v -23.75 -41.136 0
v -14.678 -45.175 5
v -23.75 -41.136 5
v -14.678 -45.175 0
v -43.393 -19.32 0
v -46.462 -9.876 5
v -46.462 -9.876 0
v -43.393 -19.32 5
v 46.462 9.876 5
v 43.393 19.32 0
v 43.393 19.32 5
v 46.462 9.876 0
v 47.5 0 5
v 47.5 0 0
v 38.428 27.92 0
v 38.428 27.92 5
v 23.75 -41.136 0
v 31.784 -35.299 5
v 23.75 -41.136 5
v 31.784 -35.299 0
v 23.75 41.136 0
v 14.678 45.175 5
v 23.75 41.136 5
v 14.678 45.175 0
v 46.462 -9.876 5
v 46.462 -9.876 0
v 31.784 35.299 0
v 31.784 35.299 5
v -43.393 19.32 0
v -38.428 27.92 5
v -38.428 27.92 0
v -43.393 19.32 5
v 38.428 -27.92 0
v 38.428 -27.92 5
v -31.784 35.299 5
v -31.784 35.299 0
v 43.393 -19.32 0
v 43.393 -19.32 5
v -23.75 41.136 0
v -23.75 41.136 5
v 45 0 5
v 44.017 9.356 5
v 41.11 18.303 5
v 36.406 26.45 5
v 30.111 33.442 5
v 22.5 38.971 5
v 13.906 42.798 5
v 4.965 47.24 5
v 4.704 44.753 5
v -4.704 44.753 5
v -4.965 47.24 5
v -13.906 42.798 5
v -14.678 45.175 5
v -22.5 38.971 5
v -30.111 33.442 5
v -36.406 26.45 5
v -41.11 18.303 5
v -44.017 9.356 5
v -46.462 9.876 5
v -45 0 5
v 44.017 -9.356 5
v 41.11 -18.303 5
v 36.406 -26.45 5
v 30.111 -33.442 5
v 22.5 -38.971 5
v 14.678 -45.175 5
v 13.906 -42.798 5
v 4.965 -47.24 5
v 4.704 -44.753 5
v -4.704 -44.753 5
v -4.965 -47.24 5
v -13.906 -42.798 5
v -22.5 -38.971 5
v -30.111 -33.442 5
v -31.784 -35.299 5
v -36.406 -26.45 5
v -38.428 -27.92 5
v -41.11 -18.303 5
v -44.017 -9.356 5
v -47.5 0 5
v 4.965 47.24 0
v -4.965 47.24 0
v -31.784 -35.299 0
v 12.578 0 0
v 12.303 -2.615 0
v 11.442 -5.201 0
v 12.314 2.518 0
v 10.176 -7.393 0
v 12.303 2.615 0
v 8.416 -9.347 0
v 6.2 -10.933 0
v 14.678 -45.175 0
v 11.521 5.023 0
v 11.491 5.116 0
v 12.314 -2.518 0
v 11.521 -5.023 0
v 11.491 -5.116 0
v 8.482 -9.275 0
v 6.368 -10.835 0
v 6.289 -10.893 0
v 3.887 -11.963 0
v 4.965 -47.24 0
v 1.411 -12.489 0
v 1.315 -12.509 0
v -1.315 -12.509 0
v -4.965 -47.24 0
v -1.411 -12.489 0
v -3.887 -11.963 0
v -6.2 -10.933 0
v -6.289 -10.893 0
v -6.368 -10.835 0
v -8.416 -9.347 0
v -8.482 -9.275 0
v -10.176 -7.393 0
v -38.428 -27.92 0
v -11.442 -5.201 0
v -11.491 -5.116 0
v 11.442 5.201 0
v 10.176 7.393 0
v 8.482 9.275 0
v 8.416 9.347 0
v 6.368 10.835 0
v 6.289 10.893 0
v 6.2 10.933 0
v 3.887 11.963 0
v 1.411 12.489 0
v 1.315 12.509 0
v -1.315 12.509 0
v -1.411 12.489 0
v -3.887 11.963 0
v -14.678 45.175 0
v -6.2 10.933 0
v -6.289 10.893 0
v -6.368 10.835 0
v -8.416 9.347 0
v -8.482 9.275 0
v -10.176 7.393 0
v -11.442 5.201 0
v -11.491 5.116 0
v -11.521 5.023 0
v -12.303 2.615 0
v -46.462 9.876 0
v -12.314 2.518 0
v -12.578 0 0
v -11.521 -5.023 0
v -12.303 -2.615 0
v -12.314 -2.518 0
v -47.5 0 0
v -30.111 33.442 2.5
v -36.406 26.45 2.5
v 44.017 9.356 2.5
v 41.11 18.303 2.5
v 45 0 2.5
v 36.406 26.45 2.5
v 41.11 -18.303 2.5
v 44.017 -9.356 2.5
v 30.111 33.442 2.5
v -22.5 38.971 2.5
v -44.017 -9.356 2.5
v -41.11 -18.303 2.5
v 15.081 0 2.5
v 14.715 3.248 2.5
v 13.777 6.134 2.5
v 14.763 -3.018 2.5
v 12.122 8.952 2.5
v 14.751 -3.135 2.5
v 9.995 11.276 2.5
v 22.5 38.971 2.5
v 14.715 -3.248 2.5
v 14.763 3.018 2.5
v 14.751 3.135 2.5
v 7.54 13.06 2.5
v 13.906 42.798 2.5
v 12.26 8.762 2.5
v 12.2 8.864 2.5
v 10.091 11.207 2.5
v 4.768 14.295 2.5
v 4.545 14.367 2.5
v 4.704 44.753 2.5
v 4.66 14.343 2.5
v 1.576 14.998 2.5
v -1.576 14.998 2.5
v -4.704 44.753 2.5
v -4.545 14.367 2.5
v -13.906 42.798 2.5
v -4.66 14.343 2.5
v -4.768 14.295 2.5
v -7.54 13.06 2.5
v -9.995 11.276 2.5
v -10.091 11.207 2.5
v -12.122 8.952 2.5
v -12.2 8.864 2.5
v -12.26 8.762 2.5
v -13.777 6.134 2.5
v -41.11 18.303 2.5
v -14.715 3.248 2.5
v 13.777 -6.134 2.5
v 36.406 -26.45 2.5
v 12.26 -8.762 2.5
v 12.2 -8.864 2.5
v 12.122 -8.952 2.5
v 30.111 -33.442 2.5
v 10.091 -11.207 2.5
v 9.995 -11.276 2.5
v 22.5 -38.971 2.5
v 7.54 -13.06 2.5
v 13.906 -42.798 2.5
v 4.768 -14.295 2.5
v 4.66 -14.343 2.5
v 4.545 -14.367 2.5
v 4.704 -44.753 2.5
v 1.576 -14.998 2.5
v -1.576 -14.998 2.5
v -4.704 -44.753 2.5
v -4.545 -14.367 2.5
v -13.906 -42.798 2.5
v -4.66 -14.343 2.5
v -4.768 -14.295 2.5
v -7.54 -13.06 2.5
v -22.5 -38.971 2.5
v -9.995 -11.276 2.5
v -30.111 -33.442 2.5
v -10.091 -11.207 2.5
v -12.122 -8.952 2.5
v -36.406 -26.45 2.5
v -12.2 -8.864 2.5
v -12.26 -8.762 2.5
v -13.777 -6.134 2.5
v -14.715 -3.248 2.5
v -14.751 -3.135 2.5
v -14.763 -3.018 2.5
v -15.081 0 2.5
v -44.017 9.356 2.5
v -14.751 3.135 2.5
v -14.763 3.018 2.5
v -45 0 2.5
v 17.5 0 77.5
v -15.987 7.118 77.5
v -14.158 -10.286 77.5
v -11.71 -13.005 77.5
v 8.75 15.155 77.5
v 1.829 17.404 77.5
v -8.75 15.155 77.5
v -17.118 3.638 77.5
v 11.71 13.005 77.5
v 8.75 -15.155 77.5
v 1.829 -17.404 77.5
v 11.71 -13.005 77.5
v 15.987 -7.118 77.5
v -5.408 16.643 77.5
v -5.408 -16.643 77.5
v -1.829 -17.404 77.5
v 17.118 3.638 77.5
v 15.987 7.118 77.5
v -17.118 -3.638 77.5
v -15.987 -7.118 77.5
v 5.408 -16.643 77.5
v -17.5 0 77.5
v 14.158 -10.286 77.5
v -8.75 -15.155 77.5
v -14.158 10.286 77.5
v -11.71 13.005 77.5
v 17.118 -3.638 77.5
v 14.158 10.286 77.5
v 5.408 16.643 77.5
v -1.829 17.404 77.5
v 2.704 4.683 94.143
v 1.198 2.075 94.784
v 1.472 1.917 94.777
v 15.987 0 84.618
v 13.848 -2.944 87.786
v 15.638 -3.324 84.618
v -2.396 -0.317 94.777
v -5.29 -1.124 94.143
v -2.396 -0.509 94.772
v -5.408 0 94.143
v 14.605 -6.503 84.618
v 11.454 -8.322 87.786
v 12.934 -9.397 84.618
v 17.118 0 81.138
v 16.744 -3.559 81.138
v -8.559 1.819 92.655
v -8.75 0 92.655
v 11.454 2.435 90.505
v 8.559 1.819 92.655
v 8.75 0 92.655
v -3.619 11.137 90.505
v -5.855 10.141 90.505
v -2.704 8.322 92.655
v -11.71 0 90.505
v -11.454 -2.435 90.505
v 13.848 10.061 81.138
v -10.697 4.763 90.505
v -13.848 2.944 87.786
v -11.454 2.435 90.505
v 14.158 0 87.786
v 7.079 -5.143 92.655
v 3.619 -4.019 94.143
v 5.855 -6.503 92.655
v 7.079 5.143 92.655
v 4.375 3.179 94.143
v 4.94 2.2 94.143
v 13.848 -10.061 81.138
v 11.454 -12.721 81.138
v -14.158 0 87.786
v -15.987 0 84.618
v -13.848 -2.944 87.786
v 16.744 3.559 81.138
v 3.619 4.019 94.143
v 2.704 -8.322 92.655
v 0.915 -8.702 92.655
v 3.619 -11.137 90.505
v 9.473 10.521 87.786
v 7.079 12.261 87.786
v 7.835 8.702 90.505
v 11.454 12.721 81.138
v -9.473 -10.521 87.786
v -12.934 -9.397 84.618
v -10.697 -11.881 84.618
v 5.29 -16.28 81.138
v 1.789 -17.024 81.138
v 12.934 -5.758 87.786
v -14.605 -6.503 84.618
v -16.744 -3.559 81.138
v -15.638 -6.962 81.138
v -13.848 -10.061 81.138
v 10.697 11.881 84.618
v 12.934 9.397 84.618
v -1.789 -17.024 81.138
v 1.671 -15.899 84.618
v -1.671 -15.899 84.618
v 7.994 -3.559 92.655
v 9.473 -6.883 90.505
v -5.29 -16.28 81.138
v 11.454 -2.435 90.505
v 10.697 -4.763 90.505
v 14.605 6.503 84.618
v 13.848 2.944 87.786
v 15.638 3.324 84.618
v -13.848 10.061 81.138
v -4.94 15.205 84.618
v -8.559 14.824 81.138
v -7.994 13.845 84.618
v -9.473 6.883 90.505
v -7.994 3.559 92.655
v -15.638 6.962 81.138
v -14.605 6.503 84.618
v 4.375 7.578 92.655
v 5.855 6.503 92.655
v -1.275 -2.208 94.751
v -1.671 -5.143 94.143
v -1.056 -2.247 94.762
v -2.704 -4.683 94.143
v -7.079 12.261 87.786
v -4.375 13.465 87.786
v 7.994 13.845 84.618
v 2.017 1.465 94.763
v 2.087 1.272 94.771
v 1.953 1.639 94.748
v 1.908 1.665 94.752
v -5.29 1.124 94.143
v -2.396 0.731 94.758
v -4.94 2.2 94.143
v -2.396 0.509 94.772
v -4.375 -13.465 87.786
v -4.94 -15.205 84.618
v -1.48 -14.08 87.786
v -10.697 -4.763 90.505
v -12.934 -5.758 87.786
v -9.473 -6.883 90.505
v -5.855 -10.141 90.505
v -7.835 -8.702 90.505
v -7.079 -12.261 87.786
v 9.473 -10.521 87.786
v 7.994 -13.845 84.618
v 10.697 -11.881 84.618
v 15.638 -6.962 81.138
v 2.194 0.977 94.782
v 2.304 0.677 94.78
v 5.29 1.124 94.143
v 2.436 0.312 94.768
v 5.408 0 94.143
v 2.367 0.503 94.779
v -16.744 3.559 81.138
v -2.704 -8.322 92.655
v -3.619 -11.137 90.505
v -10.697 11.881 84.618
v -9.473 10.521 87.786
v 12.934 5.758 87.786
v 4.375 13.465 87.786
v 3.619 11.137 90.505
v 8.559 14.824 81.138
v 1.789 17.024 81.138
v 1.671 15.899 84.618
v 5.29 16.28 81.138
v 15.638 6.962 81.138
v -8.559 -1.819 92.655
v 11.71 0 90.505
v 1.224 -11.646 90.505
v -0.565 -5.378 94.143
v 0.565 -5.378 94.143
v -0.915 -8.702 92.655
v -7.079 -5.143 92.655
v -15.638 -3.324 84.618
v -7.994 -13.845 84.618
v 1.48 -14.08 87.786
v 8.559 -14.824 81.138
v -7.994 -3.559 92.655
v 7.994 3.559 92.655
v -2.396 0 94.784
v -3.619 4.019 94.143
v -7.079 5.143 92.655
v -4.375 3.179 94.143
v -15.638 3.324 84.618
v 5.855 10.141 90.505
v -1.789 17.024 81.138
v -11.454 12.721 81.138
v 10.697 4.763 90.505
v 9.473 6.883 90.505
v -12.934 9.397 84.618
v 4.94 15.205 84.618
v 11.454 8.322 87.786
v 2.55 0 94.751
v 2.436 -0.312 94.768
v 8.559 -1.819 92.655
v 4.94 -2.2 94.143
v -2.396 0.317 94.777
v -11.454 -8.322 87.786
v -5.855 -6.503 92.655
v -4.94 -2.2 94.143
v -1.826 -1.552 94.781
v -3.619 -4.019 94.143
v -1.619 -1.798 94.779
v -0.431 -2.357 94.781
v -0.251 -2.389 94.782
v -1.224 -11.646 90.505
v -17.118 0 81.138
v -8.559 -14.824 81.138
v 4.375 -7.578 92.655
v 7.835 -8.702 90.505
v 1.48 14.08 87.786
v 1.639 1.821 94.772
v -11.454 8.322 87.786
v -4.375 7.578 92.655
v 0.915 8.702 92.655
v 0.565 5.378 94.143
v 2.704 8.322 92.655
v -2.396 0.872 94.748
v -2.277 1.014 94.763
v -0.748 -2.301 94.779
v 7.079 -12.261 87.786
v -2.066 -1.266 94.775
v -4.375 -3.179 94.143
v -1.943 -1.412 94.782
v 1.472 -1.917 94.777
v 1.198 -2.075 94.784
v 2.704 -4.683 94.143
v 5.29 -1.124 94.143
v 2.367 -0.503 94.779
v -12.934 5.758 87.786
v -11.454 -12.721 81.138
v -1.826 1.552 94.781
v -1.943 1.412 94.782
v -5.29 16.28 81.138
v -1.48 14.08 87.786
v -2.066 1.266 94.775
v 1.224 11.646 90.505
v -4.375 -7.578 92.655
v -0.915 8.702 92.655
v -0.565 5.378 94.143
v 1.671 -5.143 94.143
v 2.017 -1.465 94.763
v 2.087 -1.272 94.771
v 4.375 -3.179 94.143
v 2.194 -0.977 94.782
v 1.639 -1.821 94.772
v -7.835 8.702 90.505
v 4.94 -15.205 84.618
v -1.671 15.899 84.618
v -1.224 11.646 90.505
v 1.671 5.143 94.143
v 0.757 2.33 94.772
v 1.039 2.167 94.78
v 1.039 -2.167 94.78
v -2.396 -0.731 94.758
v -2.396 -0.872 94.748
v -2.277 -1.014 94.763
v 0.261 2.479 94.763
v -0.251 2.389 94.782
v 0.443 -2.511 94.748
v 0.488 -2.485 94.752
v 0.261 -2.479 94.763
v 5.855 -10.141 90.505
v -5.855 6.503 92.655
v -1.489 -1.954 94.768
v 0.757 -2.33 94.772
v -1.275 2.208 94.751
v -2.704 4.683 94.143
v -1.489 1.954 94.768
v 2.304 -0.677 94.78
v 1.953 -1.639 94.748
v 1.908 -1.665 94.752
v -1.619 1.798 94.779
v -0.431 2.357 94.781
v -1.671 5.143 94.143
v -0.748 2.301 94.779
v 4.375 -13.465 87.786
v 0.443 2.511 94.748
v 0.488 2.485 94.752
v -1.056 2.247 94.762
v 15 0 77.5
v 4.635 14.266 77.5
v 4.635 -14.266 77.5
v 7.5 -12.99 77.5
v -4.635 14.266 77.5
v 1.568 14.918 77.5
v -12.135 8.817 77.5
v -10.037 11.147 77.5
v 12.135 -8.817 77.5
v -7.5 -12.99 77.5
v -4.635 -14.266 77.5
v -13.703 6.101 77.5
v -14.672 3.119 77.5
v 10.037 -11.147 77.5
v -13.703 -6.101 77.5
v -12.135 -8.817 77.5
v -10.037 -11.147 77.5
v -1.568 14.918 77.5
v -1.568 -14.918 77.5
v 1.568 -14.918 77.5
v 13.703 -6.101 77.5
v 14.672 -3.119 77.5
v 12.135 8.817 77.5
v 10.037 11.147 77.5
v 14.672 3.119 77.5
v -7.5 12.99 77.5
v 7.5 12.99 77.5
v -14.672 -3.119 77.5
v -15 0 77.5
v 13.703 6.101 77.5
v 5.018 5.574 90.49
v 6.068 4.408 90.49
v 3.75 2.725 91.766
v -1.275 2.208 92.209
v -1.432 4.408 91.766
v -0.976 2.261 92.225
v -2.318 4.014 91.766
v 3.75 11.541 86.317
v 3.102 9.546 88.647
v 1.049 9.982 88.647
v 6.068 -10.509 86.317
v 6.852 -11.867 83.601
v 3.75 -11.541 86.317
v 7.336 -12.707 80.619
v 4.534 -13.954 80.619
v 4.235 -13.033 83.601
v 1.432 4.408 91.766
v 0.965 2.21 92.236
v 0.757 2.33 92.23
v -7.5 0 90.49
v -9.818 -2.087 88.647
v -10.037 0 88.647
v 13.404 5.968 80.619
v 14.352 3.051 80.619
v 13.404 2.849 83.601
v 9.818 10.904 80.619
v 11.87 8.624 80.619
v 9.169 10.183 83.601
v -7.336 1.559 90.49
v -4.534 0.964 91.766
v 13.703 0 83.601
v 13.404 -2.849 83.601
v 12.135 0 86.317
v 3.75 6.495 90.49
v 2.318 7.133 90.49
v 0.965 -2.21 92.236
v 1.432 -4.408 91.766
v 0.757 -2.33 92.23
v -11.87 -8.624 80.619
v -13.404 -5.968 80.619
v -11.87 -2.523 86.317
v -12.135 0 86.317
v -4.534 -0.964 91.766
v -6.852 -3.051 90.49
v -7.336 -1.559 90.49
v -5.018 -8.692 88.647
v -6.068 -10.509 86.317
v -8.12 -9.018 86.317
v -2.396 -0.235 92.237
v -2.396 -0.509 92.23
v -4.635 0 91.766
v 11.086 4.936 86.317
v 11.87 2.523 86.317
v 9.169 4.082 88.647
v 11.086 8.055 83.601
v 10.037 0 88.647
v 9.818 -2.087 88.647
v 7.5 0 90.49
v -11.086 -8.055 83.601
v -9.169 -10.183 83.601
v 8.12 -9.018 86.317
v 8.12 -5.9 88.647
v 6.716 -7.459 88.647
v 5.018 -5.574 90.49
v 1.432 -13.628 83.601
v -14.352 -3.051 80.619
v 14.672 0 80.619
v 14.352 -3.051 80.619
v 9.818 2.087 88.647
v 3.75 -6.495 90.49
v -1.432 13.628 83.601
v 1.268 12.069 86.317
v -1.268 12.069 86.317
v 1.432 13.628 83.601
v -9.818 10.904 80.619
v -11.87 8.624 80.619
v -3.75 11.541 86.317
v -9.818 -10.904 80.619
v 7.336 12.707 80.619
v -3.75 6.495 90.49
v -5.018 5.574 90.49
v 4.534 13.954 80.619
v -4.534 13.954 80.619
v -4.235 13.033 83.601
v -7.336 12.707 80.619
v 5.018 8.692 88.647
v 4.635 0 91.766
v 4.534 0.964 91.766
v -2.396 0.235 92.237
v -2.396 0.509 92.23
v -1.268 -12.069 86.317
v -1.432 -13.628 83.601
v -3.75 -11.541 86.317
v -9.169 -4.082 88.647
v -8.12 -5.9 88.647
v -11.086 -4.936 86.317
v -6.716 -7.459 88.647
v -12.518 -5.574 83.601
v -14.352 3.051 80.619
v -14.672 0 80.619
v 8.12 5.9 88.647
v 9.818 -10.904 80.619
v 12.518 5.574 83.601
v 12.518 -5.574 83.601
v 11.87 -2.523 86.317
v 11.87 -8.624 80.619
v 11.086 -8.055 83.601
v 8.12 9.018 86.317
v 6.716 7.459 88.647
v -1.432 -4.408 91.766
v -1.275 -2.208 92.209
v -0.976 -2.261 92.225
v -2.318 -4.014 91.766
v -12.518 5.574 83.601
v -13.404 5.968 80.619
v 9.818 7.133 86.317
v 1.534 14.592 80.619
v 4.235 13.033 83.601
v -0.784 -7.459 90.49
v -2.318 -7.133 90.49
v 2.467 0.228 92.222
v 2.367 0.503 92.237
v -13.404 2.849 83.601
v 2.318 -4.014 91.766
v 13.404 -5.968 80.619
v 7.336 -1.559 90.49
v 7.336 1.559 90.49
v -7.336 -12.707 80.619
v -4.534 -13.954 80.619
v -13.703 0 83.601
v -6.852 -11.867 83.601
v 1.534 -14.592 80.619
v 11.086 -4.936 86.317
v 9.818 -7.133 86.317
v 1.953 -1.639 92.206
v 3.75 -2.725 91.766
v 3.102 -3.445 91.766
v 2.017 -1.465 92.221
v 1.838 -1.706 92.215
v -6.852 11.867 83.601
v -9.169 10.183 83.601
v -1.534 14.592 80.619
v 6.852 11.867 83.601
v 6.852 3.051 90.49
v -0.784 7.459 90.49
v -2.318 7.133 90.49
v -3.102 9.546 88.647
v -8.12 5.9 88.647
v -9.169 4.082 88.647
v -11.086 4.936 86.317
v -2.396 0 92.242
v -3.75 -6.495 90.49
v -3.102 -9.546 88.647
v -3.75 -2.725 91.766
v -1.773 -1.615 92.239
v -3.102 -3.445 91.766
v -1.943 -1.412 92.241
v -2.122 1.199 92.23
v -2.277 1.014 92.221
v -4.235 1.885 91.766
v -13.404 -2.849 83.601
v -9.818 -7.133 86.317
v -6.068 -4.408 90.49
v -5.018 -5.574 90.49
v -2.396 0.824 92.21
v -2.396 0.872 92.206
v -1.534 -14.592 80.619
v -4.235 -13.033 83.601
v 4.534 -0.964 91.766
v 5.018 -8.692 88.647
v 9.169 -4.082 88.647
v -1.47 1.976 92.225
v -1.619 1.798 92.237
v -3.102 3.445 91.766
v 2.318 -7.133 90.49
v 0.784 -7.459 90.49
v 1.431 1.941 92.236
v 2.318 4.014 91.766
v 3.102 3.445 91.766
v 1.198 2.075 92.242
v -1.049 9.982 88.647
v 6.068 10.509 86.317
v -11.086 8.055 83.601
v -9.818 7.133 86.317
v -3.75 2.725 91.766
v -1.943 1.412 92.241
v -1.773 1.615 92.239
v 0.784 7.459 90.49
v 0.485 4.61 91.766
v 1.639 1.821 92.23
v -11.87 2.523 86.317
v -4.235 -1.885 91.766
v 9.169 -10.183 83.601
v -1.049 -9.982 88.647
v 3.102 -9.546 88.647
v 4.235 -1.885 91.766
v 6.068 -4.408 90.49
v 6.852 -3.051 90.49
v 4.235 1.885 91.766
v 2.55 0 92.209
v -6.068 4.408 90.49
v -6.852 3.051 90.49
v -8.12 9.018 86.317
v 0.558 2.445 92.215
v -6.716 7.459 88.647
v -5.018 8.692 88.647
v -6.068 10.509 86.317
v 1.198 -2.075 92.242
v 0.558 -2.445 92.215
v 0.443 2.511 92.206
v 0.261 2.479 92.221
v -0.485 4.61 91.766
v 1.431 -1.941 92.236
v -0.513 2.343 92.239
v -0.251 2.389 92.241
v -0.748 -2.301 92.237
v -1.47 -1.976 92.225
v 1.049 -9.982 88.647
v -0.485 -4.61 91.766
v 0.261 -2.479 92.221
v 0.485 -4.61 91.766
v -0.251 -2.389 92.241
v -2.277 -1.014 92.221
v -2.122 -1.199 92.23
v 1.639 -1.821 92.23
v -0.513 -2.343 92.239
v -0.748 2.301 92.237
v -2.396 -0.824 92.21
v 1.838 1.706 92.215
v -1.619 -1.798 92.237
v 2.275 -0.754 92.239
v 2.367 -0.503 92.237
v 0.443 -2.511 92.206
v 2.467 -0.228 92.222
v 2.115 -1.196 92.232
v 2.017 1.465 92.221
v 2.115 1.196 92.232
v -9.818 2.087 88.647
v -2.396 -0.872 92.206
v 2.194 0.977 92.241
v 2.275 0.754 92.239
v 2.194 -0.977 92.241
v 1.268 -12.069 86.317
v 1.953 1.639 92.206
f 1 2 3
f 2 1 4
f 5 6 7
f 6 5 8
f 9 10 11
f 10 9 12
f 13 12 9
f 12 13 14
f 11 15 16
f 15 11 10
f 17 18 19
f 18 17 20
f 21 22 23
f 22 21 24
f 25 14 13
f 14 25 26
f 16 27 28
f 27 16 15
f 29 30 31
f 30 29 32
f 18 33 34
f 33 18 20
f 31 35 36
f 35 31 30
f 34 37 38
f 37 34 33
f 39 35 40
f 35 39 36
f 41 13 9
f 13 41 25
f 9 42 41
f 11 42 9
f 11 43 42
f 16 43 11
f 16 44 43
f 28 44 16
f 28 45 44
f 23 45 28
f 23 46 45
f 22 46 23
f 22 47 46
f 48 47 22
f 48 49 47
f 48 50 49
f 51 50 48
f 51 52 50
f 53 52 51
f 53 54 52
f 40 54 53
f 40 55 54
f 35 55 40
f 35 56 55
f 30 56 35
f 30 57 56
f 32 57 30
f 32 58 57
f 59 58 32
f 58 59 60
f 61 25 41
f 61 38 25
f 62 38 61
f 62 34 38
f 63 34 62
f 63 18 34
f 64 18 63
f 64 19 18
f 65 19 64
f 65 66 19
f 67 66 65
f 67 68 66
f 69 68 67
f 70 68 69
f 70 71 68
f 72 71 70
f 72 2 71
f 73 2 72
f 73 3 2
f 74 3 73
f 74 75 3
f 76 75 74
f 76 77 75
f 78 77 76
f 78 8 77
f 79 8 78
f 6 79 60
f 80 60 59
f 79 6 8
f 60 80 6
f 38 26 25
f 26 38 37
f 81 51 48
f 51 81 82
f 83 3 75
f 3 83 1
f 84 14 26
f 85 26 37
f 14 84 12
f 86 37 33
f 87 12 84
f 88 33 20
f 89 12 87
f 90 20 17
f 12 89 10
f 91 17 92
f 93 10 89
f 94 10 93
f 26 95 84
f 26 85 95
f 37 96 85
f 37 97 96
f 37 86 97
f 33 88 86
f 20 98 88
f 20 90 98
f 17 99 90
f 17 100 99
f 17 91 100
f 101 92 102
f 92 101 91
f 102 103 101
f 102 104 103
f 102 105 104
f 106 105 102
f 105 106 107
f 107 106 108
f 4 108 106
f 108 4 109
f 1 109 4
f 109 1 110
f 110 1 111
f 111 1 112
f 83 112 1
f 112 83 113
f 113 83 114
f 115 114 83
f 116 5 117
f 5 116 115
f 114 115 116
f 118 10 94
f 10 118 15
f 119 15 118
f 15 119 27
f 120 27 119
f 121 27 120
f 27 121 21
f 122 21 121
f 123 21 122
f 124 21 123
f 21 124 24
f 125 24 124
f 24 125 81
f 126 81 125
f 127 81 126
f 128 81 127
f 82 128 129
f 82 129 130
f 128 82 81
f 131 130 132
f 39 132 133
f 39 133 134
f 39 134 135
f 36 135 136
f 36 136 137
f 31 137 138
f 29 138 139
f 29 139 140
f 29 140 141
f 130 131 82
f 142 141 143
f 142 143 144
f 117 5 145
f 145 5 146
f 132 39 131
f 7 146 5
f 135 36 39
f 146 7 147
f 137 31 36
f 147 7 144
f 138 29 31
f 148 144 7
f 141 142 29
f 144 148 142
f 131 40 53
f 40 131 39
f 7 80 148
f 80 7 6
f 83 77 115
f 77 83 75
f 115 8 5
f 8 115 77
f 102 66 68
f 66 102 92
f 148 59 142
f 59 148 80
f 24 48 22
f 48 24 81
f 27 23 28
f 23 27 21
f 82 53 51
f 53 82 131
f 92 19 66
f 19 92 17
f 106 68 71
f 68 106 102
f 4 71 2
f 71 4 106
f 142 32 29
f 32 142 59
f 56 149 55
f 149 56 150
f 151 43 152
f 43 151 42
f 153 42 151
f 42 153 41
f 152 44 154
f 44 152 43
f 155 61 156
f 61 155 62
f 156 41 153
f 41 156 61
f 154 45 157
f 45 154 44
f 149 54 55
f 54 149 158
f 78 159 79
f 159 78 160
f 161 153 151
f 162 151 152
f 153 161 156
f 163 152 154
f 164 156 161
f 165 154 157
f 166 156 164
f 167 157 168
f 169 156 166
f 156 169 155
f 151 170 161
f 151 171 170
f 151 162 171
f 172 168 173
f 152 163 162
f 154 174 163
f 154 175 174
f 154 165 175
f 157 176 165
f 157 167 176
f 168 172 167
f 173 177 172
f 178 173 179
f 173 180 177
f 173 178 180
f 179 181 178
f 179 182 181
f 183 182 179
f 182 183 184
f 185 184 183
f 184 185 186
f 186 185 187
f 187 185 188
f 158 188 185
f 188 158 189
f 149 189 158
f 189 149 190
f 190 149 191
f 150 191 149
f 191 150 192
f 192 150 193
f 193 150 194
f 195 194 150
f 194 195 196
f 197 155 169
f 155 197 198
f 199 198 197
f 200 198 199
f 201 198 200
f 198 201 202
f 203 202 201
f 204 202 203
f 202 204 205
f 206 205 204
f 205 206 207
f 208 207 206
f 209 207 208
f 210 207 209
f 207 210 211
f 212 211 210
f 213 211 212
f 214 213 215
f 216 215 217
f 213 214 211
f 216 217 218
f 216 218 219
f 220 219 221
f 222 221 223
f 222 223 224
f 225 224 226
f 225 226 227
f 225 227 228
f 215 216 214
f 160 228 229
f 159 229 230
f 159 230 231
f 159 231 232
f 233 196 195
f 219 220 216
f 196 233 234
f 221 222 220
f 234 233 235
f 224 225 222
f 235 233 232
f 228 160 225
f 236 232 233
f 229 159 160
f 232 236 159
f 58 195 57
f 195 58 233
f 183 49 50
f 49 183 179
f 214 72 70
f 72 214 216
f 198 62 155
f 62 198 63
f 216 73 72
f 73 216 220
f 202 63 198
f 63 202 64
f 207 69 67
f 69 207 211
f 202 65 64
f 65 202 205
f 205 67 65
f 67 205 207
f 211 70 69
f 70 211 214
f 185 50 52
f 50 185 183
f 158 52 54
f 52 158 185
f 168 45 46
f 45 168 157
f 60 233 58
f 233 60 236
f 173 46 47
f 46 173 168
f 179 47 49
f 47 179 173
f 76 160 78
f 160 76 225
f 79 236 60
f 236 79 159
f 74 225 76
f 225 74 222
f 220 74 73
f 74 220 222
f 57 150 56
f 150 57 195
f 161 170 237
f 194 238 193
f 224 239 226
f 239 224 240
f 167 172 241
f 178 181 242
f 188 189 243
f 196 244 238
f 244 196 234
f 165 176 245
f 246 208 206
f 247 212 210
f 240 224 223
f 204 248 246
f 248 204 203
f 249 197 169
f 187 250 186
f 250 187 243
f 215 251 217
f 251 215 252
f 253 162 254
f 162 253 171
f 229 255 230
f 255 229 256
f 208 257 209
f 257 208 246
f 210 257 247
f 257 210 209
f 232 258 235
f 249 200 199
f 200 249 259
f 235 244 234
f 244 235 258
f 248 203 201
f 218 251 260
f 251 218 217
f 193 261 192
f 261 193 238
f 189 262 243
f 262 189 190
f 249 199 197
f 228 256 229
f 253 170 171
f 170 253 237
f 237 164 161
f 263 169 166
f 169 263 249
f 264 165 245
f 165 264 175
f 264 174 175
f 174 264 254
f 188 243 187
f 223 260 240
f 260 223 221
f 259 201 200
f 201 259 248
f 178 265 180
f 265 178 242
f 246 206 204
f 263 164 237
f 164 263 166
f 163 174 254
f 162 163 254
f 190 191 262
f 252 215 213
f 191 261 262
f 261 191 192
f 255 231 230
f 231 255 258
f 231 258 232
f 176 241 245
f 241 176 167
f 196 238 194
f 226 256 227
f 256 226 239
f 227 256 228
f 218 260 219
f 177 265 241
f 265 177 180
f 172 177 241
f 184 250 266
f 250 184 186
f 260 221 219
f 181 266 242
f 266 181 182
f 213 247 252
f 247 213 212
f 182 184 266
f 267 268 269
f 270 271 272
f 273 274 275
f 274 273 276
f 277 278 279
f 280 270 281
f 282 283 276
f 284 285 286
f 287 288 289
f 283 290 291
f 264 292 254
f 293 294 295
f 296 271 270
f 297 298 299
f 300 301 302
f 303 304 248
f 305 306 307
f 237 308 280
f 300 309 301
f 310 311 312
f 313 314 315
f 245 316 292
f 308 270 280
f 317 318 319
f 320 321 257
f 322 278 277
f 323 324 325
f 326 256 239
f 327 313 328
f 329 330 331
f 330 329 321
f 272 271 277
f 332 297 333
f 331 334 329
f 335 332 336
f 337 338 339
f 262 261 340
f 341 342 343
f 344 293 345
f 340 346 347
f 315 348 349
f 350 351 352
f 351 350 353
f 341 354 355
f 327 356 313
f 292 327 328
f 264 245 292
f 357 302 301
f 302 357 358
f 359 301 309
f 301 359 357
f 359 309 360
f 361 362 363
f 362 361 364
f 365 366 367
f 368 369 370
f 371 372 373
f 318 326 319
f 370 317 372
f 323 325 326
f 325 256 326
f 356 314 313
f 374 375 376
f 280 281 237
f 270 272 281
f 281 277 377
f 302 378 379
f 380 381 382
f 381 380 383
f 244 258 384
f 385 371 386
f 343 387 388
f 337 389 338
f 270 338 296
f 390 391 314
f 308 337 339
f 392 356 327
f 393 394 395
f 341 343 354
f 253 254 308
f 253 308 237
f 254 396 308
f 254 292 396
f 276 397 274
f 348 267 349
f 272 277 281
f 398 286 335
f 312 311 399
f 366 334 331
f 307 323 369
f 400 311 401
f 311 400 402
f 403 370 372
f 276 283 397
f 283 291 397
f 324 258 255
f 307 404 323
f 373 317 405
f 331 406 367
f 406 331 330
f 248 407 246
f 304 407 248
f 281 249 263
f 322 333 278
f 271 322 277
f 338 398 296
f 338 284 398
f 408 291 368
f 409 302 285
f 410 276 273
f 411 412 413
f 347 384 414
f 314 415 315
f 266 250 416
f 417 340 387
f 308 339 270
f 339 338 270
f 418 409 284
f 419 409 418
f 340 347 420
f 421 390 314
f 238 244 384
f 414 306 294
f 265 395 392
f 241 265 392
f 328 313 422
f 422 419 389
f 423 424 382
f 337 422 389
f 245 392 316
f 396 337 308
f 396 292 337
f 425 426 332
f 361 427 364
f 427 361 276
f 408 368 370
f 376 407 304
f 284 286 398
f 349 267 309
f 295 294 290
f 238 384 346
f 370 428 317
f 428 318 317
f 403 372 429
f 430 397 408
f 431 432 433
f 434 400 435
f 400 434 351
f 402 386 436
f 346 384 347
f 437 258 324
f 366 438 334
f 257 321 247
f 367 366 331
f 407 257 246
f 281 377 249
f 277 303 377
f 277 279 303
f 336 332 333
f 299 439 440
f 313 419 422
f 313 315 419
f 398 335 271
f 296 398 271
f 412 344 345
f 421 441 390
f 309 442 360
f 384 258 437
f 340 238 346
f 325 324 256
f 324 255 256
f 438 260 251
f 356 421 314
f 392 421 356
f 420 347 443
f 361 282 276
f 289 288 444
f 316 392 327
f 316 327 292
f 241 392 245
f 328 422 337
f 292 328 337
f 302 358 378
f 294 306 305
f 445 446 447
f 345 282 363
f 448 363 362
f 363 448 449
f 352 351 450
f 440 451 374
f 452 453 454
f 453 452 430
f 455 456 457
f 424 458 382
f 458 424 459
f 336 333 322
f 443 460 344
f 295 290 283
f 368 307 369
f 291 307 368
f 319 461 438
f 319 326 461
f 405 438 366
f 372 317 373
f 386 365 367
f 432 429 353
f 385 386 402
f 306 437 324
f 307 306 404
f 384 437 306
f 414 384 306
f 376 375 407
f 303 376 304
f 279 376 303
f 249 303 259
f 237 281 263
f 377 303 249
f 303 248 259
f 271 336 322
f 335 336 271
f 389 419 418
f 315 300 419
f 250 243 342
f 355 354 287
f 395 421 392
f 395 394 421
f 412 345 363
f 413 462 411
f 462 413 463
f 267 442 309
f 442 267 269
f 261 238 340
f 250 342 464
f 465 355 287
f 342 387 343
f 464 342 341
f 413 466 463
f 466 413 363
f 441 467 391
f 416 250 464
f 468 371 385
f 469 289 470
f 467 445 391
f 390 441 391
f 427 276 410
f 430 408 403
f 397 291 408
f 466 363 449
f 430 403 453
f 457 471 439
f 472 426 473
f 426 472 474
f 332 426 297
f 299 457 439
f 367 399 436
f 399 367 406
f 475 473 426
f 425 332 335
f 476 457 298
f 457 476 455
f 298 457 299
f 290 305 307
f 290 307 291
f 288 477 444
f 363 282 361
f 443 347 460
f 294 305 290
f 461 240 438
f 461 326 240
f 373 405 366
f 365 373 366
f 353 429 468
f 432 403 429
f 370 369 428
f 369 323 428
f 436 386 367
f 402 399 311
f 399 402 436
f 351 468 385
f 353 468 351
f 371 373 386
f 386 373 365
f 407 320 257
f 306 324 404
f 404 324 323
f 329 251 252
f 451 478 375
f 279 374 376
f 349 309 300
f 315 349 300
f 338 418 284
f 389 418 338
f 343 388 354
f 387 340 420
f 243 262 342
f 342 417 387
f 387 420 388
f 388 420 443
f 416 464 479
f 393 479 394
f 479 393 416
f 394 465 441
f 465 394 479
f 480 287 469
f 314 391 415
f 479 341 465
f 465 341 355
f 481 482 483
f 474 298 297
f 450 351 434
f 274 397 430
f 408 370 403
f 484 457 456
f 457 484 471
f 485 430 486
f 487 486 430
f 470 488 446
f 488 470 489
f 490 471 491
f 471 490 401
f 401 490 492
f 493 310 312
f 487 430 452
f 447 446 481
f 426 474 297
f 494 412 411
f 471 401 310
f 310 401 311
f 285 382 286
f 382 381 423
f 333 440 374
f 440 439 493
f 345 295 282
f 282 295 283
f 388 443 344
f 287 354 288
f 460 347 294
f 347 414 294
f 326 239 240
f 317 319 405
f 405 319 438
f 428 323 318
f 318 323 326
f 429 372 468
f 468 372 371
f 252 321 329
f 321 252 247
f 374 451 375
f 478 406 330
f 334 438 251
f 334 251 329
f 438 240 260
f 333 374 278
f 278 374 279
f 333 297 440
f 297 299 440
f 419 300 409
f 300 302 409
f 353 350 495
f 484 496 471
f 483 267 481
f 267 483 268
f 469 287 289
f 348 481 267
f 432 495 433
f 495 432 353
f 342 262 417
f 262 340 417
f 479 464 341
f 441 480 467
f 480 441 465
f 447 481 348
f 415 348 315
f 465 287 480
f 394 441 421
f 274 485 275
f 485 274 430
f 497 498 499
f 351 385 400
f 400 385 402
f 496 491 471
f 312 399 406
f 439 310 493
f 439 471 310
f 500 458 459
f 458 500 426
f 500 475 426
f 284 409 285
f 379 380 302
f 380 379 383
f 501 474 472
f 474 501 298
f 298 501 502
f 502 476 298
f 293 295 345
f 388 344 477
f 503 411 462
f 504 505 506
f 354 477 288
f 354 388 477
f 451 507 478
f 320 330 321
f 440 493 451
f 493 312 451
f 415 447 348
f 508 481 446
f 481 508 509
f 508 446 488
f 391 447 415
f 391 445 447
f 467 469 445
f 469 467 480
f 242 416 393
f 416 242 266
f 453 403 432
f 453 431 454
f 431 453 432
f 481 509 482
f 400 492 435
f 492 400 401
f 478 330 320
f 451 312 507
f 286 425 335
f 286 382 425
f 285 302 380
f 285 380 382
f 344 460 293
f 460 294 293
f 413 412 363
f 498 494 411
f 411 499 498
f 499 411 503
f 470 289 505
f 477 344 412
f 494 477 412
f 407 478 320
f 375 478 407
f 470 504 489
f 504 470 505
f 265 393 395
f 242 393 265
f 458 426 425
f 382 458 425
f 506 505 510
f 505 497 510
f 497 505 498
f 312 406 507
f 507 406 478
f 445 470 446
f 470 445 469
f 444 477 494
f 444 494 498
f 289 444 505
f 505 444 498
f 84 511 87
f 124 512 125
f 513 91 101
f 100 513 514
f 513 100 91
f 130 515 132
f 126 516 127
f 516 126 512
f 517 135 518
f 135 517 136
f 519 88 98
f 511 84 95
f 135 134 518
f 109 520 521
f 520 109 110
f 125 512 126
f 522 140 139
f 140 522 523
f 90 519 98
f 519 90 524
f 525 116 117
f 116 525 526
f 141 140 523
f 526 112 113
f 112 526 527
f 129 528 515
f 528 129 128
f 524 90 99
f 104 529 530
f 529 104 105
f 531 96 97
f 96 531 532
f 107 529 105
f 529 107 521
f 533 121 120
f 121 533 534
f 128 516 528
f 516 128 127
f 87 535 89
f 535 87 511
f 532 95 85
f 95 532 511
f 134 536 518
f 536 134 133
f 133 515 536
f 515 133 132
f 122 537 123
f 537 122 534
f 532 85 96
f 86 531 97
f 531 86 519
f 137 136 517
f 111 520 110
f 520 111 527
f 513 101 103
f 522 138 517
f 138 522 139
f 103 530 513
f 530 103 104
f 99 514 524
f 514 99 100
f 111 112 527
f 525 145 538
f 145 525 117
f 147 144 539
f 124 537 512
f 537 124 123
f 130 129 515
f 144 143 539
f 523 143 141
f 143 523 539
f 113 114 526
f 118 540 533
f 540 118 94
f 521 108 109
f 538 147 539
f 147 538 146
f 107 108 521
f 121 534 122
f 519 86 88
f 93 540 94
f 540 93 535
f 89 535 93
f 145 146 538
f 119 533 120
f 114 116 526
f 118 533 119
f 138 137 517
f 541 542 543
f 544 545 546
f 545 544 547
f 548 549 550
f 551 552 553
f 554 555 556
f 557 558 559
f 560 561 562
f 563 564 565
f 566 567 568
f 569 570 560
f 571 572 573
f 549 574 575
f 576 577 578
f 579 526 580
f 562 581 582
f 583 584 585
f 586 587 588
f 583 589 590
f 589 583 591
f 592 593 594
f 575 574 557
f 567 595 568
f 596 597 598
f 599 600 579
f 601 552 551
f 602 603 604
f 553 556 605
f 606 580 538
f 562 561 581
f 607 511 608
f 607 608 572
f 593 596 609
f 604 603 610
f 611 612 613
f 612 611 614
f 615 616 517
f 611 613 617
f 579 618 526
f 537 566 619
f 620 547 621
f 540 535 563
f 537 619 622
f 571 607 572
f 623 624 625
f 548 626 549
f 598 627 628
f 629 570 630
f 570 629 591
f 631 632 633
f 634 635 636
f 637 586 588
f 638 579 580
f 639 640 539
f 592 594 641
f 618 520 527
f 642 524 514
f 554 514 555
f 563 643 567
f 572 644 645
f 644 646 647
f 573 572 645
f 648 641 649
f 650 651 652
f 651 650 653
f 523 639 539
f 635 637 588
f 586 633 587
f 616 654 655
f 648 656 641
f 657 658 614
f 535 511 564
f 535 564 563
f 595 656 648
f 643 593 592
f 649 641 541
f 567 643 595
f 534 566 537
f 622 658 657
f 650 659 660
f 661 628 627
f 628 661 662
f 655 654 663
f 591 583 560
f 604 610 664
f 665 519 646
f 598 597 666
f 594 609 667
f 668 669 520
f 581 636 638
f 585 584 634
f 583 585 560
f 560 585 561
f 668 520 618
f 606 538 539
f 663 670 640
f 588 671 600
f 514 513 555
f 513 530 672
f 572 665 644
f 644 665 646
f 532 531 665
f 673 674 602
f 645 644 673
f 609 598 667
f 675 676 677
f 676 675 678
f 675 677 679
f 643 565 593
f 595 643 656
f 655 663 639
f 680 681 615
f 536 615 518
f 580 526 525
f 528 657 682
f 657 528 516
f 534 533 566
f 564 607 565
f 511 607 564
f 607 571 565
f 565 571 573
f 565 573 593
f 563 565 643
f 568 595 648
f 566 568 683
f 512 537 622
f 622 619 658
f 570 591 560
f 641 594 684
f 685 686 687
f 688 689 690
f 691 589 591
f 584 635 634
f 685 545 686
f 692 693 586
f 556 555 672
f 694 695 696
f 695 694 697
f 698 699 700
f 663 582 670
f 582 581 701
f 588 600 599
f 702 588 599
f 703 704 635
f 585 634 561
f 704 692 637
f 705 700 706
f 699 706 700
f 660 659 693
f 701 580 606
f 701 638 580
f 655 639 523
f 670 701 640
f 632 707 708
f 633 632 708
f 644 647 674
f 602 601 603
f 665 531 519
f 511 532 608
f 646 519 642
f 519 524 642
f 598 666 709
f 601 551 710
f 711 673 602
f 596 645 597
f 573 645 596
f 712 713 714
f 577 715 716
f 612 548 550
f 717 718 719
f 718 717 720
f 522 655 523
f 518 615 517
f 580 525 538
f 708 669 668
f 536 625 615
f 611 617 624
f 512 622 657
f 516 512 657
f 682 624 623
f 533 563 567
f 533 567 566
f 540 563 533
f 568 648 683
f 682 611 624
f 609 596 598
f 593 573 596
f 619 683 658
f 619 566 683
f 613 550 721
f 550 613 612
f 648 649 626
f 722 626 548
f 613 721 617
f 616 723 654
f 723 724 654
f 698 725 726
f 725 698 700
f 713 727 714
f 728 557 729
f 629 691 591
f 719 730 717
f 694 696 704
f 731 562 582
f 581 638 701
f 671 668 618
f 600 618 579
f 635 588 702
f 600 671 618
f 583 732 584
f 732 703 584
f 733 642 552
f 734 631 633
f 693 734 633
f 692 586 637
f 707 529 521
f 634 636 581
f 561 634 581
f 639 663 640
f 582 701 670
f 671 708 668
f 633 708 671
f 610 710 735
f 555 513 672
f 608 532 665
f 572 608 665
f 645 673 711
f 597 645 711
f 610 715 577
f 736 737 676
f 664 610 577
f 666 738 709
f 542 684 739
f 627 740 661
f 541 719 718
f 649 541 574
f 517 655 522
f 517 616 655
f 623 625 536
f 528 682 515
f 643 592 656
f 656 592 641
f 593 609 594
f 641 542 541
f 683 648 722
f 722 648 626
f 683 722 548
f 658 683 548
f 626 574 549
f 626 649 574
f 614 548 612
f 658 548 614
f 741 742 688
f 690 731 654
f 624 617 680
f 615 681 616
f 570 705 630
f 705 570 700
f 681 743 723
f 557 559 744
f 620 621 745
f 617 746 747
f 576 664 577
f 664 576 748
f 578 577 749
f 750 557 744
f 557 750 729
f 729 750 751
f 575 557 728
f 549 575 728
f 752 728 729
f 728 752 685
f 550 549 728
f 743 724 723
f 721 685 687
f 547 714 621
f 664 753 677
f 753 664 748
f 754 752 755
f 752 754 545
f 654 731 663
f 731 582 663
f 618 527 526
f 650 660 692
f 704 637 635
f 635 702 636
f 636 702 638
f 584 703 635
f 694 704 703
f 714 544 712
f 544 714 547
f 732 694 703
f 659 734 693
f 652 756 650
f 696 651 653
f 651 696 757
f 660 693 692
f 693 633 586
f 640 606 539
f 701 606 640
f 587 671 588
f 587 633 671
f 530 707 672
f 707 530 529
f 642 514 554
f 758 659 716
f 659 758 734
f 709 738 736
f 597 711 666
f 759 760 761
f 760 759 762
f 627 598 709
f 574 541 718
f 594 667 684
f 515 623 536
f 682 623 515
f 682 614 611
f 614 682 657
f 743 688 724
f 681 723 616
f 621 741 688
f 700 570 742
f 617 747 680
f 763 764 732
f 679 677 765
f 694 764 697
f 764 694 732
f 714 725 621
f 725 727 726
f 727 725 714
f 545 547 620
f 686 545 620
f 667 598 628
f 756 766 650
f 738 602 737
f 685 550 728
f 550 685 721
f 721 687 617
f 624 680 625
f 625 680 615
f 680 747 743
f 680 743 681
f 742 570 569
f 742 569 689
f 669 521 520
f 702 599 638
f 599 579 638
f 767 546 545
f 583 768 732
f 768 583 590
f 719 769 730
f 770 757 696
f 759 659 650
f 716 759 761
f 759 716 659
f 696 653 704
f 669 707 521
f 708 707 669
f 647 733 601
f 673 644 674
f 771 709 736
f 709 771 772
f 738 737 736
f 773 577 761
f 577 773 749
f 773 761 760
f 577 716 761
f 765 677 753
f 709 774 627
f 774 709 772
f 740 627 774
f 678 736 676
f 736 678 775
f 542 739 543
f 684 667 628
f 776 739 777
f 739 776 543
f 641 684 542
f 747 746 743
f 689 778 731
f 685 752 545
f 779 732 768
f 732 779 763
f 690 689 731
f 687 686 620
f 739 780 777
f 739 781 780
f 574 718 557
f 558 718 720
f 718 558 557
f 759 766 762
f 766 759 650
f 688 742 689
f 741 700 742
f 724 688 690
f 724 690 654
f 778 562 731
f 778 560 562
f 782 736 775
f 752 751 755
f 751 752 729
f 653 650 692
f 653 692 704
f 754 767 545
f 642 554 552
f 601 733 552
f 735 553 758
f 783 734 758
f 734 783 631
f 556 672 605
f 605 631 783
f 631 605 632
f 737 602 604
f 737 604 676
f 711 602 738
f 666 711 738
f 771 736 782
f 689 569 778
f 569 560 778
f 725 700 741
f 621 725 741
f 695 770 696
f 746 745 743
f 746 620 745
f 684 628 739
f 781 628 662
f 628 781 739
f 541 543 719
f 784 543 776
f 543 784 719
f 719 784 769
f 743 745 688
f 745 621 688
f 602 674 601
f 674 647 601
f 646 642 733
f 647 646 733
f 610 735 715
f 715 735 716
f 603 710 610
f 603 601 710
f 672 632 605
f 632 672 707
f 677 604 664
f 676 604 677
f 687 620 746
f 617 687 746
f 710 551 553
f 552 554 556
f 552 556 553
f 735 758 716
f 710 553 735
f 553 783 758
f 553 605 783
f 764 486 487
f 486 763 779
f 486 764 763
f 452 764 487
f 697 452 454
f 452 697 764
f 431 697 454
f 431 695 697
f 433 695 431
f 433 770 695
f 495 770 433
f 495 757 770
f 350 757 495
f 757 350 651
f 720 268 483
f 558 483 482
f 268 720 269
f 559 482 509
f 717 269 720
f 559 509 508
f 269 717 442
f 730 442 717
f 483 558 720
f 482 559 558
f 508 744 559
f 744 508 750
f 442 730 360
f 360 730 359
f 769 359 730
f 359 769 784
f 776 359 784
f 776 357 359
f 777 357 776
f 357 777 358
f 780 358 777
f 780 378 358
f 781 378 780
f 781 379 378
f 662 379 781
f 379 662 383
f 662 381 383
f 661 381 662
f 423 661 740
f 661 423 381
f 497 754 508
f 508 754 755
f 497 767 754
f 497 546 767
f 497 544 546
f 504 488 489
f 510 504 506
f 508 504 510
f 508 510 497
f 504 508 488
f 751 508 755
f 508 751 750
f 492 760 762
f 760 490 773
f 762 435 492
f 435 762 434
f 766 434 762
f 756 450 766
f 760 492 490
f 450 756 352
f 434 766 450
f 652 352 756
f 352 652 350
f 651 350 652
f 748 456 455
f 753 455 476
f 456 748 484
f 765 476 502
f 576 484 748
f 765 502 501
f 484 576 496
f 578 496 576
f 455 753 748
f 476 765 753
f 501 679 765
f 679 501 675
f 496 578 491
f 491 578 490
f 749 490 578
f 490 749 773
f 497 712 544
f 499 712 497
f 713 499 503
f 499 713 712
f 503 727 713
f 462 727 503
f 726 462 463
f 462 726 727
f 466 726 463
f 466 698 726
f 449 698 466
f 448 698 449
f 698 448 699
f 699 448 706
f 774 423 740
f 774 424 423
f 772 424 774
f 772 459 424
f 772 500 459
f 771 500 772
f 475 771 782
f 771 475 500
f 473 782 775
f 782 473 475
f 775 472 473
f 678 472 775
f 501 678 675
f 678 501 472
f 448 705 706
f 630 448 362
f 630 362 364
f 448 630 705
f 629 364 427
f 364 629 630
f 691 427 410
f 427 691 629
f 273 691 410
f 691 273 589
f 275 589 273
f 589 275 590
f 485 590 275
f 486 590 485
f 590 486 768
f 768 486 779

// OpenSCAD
handleRadius = 35 / 2;
handleHeight = 95;
baseRadius = 95 /2;
wallThickness = 2.5;
ledRadius = 5.1 / 2;


difference(){
    union(){
        //base
        difference(){
            cylinder(h = wallThickness * 2, r = baseRadius);
            translate([0,0,wallThickness]) cylinder(h = wallThickness * 2, r = baseRadius - wallThickness);
        }
        //handle
        cylinder(h = handleHeight - handleRadius, r1 = handleRadius - wallThickness, r2 = handleRadius);
        translate([0,0,handleHeight - handleRadius]) sphere(handleRadius);
    }
    union(){
        //holes
        translate([0,0,-wallThickness]) cylinder(h = handleHeight - handleRadius + wallThickness, r1 = handleRadius - wallThickness*2, r2 = handleRadius - wallThickness);
        translate([0,0,handleHeight - handleRadius]) sphere(handleRadius - wallThickness);
        translate([0,0,handleHeight]) cylinder(h = wallThickness * 3, r = ledRadius, center = true);
    }
}
